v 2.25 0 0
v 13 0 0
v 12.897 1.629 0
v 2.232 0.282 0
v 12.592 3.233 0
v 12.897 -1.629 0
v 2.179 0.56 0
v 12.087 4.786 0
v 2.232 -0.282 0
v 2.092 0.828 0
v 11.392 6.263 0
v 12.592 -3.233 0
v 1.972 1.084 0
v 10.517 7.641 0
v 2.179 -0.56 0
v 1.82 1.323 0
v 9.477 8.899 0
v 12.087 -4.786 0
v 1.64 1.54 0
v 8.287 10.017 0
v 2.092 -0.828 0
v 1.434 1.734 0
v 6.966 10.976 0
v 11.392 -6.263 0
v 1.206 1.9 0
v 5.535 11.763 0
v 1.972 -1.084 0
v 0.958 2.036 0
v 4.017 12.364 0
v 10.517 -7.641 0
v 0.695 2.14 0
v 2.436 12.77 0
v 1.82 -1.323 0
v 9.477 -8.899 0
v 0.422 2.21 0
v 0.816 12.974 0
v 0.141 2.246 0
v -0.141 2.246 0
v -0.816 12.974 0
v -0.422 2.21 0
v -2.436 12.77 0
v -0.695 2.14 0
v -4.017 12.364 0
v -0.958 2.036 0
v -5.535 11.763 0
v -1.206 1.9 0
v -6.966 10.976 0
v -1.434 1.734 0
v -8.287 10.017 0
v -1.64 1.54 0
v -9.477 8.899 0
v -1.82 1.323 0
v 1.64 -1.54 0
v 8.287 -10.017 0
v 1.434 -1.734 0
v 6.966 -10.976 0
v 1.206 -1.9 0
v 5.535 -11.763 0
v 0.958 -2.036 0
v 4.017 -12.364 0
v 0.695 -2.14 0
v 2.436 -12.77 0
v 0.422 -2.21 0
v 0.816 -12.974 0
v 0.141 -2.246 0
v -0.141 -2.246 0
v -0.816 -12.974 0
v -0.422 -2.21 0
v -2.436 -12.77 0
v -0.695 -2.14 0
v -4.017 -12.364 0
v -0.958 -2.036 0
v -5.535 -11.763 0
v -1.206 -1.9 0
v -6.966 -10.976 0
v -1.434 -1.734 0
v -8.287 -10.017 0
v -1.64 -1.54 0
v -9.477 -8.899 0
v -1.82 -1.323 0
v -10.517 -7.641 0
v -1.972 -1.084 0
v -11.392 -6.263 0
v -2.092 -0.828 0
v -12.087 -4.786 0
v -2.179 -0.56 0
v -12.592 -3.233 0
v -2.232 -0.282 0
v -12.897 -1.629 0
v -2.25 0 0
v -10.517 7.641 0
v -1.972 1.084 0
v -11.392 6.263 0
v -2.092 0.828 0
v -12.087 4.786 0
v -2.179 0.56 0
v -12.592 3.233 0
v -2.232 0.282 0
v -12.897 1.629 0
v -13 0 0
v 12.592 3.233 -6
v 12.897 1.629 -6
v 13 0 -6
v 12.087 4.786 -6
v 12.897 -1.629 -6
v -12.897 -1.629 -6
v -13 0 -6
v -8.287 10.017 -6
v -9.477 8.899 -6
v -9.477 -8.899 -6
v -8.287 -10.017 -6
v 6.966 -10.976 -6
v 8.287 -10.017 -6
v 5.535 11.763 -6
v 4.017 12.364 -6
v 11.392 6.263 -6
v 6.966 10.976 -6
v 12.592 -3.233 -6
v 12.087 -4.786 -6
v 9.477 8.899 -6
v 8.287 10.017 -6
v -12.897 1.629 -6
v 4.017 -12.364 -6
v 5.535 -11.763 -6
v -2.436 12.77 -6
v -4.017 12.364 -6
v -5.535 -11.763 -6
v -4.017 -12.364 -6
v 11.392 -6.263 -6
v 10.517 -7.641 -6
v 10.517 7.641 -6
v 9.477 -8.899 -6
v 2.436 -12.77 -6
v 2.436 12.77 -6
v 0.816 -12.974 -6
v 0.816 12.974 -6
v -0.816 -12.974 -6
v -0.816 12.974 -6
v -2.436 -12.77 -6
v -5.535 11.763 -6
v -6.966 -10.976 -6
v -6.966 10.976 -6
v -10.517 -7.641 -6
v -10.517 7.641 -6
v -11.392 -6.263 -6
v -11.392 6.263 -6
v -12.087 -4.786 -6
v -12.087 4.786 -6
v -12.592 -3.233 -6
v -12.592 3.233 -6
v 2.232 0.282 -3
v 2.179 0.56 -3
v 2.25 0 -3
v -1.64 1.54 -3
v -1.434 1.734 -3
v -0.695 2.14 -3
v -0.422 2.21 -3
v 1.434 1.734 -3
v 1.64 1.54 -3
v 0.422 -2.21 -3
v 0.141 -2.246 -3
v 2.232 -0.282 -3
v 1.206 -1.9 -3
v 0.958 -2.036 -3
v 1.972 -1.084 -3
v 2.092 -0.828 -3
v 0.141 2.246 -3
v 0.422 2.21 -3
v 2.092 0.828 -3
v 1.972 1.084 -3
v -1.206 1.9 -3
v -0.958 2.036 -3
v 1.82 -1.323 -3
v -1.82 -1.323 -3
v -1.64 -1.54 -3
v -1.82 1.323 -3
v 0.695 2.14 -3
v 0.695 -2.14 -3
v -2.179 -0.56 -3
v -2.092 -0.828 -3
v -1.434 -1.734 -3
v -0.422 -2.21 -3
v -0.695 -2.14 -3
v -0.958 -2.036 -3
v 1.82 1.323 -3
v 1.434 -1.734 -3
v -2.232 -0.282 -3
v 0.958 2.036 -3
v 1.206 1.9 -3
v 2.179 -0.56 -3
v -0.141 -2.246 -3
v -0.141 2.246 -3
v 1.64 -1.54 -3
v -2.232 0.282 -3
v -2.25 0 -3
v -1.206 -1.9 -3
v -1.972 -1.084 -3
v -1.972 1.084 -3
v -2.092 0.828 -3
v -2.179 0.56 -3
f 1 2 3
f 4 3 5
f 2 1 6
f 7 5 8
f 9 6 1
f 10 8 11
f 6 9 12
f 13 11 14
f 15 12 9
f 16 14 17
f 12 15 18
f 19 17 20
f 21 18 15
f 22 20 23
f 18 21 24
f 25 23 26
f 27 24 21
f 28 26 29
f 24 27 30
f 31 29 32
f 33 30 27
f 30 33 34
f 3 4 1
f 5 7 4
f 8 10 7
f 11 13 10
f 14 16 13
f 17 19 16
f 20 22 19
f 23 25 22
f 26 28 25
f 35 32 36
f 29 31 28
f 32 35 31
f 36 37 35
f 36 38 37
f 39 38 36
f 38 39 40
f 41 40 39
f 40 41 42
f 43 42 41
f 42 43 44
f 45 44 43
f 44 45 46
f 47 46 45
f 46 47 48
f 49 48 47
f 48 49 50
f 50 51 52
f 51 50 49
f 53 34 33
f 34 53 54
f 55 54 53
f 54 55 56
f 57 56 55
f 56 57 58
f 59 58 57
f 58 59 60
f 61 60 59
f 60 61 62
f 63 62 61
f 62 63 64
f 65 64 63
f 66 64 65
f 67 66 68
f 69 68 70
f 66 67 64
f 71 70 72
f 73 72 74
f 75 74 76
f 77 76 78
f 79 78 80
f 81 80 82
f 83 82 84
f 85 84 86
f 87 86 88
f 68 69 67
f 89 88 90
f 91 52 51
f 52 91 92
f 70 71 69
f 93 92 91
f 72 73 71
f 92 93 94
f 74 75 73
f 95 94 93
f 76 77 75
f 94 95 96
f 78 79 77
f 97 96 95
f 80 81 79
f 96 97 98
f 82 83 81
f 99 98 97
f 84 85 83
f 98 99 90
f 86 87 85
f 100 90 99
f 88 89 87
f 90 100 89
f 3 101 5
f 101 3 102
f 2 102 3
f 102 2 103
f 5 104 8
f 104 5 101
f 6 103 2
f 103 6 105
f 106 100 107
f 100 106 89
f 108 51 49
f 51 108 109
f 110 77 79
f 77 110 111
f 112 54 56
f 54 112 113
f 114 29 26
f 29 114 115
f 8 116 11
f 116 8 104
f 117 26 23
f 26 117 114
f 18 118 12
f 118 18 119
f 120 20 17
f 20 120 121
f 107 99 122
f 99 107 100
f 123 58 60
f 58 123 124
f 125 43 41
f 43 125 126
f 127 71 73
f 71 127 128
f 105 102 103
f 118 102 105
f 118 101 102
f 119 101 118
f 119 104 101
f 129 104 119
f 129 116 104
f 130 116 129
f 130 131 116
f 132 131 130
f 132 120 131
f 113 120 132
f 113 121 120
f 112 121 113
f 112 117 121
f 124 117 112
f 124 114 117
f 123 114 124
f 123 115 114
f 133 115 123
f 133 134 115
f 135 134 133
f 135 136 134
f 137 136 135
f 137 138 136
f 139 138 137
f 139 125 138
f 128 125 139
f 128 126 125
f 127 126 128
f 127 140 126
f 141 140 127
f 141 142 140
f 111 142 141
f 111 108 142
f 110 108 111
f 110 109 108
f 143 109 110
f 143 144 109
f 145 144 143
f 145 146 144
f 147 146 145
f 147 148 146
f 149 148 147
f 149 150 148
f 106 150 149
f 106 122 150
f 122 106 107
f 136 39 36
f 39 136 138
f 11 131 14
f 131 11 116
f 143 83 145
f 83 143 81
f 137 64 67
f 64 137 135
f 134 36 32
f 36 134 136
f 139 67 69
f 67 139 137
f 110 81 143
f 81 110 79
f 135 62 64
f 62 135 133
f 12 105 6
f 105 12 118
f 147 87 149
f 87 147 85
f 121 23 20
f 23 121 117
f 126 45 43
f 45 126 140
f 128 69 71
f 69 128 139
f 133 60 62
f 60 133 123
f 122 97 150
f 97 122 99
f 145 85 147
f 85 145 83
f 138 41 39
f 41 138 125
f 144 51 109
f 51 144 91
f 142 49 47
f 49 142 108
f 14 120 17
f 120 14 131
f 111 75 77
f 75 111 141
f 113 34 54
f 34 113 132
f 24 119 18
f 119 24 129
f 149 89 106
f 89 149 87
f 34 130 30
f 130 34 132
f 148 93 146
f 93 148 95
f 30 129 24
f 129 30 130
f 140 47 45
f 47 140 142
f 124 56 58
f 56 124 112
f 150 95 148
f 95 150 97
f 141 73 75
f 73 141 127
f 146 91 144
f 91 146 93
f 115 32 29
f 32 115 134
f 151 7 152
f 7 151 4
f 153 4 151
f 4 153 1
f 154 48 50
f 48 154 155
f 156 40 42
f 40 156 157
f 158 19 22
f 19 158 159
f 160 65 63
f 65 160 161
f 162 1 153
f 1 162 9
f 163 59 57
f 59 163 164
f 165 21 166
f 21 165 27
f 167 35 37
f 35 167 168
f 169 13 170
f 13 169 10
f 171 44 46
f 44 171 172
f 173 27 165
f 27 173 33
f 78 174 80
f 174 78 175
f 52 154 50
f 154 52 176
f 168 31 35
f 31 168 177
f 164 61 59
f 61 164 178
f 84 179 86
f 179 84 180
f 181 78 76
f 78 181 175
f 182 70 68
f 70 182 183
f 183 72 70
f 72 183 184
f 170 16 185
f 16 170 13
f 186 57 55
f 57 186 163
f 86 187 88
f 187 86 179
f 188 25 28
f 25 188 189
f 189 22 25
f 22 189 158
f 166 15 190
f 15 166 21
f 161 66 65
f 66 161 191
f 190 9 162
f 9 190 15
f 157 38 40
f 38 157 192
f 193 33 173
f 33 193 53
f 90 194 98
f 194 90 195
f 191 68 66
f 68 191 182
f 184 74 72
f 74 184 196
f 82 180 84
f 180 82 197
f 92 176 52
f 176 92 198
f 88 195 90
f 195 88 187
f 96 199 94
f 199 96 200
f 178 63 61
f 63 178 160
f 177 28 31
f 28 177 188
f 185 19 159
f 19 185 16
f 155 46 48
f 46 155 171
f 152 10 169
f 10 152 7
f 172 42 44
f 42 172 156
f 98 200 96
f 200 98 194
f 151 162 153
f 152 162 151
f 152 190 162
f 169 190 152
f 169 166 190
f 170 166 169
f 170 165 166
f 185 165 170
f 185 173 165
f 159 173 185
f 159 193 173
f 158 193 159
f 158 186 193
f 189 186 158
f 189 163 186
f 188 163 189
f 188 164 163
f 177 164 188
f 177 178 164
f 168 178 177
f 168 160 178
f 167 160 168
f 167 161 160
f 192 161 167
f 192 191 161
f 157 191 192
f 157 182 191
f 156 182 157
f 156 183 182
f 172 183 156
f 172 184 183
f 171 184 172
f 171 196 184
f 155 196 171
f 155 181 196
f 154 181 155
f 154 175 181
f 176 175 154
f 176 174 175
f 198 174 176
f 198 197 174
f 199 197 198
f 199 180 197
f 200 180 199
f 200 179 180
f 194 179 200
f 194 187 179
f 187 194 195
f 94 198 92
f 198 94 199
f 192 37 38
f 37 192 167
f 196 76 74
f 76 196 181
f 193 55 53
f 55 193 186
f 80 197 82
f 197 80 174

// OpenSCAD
$fn = 50;


difference() {
	union() {
		translate(v = [0, 0, -3.0000000000]) {
			cylinder(h = 3, r = 7.0000000000);
		}
		translate(v = [0, 0, -6.0000000000]) {
			cylinder(h = 6, r = 13.0000000000);
		}
	}
	union() {
		#translate(v = [0, 0, -3]) {
			cylinder(h = 3, r = 2.2500000000);
		}
	}
}
